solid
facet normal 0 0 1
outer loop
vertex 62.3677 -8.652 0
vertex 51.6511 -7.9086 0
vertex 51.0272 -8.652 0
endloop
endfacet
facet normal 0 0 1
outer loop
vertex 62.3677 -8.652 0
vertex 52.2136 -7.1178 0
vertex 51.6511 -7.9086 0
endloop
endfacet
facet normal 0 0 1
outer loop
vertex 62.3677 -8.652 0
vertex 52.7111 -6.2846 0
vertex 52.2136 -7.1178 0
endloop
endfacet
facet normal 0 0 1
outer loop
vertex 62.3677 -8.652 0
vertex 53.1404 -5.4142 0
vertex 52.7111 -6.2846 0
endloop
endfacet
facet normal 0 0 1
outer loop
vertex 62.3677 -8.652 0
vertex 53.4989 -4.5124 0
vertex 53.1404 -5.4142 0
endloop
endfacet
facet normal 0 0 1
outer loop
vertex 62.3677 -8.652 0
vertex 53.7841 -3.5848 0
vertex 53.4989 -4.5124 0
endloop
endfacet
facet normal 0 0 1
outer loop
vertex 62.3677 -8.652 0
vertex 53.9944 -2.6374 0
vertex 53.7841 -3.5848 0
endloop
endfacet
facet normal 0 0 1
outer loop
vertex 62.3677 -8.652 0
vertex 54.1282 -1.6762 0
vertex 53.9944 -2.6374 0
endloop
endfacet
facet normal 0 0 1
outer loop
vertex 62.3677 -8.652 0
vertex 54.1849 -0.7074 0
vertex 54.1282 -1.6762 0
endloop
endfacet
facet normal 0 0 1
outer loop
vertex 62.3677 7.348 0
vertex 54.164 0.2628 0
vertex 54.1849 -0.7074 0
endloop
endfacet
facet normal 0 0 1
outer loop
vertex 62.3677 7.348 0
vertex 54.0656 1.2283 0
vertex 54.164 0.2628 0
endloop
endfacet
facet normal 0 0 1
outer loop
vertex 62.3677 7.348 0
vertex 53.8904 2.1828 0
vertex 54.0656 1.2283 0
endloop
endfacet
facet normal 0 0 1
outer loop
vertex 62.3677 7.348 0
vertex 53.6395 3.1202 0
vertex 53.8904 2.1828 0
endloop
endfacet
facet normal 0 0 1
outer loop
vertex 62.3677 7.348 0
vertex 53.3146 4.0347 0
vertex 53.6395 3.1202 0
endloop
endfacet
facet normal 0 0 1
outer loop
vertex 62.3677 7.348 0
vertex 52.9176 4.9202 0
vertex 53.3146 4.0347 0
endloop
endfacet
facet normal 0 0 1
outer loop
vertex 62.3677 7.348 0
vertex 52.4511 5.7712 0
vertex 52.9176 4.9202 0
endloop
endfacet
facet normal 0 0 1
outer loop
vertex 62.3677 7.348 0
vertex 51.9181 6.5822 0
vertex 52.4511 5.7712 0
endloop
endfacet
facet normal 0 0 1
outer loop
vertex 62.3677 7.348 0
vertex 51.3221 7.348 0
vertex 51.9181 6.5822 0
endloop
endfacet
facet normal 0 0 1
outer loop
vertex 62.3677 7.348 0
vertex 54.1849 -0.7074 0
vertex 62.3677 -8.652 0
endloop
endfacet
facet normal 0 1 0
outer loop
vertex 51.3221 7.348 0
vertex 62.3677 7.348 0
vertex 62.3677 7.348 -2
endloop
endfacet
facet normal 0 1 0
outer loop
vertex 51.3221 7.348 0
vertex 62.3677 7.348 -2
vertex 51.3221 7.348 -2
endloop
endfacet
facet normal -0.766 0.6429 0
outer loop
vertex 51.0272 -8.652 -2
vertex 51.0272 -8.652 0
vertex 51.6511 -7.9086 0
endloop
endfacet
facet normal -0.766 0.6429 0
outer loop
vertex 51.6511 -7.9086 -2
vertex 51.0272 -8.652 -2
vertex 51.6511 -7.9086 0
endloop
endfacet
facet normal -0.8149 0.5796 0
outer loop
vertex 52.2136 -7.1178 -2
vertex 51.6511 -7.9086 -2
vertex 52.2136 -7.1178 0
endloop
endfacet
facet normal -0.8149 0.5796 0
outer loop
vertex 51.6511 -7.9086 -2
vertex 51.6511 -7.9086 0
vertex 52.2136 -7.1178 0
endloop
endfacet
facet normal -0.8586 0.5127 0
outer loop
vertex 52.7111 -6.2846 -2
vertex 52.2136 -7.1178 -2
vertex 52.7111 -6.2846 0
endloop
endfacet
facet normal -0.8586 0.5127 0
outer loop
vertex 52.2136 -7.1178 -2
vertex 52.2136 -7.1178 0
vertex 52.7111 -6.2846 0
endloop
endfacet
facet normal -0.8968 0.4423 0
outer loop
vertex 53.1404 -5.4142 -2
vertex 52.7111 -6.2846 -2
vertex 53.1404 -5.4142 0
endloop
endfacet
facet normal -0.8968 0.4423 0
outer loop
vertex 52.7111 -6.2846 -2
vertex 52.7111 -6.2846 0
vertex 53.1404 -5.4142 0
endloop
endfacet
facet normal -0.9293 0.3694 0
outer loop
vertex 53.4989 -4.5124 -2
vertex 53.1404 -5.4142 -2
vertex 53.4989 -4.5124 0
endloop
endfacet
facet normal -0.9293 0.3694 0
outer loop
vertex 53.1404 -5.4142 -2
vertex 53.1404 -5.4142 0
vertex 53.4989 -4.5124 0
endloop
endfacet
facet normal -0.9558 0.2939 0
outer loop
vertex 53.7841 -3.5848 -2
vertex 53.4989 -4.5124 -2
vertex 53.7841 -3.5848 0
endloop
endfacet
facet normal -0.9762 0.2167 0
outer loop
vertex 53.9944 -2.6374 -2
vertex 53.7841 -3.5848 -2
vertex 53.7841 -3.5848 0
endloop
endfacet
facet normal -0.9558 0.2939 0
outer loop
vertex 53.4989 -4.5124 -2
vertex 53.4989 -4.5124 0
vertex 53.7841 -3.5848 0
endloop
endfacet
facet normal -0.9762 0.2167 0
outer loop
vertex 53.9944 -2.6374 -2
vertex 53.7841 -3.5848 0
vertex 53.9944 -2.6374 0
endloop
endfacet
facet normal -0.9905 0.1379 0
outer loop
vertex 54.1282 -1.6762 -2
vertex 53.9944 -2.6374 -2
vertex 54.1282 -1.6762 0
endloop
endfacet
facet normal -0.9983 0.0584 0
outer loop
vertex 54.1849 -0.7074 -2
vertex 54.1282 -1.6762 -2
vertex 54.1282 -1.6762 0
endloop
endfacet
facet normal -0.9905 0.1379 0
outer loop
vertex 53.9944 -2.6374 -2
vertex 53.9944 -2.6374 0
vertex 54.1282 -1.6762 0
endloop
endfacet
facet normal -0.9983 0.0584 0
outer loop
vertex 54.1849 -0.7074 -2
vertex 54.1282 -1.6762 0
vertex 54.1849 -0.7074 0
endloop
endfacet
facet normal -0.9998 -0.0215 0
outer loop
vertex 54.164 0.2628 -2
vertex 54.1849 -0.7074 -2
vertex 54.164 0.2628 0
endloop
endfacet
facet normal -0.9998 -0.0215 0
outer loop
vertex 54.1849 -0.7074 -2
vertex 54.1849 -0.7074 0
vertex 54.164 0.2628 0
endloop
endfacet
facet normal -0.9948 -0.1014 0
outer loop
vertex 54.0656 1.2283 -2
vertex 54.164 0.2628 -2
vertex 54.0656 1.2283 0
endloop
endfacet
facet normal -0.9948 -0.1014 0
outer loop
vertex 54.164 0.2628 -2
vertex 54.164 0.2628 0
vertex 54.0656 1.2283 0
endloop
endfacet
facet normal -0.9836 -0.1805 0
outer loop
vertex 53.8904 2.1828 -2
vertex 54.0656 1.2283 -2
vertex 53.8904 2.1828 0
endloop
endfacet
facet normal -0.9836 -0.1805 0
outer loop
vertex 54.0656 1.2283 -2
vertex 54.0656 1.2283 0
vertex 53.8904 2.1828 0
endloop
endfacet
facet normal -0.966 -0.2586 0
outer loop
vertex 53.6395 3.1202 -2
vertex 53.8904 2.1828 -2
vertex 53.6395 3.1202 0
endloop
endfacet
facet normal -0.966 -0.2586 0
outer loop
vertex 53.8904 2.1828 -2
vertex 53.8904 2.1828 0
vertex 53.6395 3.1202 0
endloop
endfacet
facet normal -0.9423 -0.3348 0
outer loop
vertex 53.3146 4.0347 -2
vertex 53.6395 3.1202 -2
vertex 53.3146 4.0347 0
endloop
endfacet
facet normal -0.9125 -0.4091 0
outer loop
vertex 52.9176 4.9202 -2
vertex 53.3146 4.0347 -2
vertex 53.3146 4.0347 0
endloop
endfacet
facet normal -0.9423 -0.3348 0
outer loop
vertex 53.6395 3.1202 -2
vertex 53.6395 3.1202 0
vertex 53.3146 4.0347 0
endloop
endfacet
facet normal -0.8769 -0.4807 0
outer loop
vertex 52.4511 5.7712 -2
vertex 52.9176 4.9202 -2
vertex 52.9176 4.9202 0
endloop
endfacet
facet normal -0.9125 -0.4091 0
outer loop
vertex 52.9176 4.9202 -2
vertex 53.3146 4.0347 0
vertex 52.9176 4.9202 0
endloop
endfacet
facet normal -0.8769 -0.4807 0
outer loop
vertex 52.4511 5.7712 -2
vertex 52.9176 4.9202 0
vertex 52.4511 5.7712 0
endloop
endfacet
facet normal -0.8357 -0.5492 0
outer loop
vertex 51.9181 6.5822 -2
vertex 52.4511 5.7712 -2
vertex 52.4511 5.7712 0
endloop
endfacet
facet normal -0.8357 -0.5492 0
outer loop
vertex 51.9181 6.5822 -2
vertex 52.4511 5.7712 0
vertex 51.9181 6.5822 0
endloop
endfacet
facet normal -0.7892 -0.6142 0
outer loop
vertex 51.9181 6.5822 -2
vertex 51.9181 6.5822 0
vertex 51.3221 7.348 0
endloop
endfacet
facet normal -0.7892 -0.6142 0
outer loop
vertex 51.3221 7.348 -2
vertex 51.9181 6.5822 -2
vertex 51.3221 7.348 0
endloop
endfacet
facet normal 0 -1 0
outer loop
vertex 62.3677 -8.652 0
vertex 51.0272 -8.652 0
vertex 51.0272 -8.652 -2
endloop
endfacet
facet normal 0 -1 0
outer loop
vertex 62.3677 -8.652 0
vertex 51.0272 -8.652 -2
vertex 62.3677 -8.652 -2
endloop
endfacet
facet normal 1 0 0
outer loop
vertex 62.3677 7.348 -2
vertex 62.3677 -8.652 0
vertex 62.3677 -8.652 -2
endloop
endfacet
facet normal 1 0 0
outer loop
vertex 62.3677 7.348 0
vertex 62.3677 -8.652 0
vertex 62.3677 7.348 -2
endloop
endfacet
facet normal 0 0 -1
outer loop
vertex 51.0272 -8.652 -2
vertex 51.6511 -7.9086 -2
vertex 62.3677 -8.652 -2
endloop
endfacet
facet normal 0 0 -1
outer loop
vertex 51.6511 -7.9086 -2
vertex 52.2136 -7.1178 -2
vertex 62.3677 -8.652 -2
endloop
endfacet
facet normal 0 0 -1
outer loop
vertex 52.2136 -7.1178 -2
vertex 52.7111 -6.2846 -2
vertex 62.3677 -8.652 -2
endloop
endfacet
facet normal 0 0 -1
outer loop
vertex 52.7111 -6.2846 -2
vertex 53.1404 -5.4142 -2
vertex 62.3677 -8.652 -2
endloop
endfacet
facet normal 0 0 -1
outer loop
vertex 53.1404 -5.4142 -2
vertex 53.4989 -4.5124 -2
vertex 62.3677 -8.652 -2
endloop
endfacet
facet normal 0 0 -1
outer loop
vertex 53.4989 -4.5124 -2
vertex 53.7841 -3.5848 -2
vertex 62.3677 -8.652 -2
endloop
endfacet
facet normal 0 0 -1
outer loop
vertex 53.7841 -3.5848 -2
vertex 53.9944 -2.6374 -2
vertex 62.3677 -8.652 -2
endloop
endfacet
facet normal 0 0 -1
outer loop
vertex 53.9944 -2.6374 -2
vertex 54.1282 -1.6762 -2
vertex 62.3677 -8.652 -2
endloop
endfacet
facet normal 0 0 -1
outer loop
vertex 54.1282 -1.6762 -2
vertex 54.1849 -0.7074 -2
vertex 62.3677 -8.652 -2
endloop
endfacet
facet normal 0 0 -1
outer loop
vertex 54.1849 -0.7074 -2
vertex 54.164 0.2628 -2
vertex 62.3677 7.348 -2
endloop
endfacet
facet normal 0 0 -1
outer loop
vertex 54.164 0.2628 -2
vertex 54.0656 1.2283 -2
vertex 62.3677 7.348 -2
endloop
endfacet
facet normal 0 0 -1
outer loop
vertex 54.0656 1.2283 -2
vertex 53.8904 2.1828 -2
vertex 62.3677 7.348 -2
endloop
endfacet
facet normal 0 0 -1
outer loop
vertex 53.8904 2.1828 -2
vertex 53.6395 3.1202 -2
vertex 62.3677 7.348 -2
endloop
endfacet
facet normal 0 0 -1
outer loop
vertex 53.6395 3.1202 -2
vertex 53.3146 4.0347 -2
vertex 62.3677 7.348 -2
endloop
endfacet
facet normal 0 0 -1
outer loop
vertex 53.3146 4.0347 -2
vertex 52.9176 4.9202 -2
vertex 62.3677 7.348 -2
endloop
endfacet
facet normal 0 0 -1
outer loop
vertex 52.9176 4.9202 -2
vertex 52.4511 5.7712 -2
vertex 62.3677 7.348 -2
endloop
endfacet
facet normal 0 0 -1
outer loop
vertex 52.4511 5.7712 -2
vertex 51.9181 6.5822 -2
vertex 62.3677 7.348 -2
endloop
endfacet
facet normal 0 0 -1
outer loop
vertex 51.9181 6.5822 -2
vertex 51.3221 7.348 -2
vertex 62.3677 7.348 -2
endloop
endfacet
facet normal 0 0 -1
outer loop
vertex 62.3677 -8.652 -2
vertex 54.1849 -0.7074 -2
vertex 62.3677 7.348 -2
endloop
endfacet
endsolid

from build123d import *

# Parameters (mm, degrees)
DODANIE_WYCI_GNI_CIE1_DEPTH = 2
SZKIC2_W                    = 5
SZKIC2_H                    = 16
WYTNIJ_WYCI_GNI_CIE1_DEPTH  = 5
WYTNIJ_WYCI_GNI_CIE2_DEPTH  = 10
WYTNIJ_WYCI_GNI_CIE3_DEPTH  = 10


with BuildPart() as part:
    # Szkic1 → Dodanie-wyciągnięcie1 (new body)
    with BuildSketch(Plane.XY):
        Polygon((39.660703644, 7.348041155), (39.998203889, -8.651958845), (67.367690874, -8.651958845), (67.367690874, 7.348041155), align=None)
    extrude(amount=-DODANIE_WYCI_GNI_CIE1_DEPTH)

    # Szkic2 → Wytnij-wyciągnięcie1 (cut)
    with BuildSketch(Plane.XY):
        with Locations((64.867690874, -0.651958845)):
            Rectangle(SZKIC2_W, SZKIC2_H)
    extrude(amount=-WYTNIJ_WYCI_GNI_CIE1_DEPTH, mode=Mode.SUBTRACT)

    # Szkic3 → Wytnij-wyciągnięcie2 (cut)
    with BuildSketch(Plane.XY):
        with BuildLine():
            Line((39.660703644, 7.348041155), (39.998203889, -8.651958845))
            Line((39.998203889, -8.651958845), (48.125210145, -8.651958845))
            ThreePointArc((48.125210145, -8.651958845), (51.694710699, -0.869414217), (49.289973229, 7.348041155))
            Line((49.289973229, 7.348041155), (39.660703644, 7.348041155))
        make_face()
    extrude(amount=-WYTNIJ_WYCI_GNI_CIE2_DEPTH, mode=Mode.SUBTRACT)

    # Szkic4 → Wytnij-wyciągnięcie3 (cut)
    with BuildSketch(Plane.XY):
        with BuildLine():
            Line((48.125210145, -8.651958845), (51.027201312, -8.651958845))
            ThreePointArc((51.027201312, -8.651958845), (54.184885403, -0.707437008), (51.322077756, 7.348041155))
            Line((51.322077756, 7.348041155), (49.289973229, 7.348041155))
            Line((49.289973229, 7.348041155), (48.125210145, -8.651958845))
        make_face()
    extrude(amount=-WYTNIJ_WYCI_GNI_CIE3_DEPTH, mode=Mode.SUBTRACT)


solid = part.part
